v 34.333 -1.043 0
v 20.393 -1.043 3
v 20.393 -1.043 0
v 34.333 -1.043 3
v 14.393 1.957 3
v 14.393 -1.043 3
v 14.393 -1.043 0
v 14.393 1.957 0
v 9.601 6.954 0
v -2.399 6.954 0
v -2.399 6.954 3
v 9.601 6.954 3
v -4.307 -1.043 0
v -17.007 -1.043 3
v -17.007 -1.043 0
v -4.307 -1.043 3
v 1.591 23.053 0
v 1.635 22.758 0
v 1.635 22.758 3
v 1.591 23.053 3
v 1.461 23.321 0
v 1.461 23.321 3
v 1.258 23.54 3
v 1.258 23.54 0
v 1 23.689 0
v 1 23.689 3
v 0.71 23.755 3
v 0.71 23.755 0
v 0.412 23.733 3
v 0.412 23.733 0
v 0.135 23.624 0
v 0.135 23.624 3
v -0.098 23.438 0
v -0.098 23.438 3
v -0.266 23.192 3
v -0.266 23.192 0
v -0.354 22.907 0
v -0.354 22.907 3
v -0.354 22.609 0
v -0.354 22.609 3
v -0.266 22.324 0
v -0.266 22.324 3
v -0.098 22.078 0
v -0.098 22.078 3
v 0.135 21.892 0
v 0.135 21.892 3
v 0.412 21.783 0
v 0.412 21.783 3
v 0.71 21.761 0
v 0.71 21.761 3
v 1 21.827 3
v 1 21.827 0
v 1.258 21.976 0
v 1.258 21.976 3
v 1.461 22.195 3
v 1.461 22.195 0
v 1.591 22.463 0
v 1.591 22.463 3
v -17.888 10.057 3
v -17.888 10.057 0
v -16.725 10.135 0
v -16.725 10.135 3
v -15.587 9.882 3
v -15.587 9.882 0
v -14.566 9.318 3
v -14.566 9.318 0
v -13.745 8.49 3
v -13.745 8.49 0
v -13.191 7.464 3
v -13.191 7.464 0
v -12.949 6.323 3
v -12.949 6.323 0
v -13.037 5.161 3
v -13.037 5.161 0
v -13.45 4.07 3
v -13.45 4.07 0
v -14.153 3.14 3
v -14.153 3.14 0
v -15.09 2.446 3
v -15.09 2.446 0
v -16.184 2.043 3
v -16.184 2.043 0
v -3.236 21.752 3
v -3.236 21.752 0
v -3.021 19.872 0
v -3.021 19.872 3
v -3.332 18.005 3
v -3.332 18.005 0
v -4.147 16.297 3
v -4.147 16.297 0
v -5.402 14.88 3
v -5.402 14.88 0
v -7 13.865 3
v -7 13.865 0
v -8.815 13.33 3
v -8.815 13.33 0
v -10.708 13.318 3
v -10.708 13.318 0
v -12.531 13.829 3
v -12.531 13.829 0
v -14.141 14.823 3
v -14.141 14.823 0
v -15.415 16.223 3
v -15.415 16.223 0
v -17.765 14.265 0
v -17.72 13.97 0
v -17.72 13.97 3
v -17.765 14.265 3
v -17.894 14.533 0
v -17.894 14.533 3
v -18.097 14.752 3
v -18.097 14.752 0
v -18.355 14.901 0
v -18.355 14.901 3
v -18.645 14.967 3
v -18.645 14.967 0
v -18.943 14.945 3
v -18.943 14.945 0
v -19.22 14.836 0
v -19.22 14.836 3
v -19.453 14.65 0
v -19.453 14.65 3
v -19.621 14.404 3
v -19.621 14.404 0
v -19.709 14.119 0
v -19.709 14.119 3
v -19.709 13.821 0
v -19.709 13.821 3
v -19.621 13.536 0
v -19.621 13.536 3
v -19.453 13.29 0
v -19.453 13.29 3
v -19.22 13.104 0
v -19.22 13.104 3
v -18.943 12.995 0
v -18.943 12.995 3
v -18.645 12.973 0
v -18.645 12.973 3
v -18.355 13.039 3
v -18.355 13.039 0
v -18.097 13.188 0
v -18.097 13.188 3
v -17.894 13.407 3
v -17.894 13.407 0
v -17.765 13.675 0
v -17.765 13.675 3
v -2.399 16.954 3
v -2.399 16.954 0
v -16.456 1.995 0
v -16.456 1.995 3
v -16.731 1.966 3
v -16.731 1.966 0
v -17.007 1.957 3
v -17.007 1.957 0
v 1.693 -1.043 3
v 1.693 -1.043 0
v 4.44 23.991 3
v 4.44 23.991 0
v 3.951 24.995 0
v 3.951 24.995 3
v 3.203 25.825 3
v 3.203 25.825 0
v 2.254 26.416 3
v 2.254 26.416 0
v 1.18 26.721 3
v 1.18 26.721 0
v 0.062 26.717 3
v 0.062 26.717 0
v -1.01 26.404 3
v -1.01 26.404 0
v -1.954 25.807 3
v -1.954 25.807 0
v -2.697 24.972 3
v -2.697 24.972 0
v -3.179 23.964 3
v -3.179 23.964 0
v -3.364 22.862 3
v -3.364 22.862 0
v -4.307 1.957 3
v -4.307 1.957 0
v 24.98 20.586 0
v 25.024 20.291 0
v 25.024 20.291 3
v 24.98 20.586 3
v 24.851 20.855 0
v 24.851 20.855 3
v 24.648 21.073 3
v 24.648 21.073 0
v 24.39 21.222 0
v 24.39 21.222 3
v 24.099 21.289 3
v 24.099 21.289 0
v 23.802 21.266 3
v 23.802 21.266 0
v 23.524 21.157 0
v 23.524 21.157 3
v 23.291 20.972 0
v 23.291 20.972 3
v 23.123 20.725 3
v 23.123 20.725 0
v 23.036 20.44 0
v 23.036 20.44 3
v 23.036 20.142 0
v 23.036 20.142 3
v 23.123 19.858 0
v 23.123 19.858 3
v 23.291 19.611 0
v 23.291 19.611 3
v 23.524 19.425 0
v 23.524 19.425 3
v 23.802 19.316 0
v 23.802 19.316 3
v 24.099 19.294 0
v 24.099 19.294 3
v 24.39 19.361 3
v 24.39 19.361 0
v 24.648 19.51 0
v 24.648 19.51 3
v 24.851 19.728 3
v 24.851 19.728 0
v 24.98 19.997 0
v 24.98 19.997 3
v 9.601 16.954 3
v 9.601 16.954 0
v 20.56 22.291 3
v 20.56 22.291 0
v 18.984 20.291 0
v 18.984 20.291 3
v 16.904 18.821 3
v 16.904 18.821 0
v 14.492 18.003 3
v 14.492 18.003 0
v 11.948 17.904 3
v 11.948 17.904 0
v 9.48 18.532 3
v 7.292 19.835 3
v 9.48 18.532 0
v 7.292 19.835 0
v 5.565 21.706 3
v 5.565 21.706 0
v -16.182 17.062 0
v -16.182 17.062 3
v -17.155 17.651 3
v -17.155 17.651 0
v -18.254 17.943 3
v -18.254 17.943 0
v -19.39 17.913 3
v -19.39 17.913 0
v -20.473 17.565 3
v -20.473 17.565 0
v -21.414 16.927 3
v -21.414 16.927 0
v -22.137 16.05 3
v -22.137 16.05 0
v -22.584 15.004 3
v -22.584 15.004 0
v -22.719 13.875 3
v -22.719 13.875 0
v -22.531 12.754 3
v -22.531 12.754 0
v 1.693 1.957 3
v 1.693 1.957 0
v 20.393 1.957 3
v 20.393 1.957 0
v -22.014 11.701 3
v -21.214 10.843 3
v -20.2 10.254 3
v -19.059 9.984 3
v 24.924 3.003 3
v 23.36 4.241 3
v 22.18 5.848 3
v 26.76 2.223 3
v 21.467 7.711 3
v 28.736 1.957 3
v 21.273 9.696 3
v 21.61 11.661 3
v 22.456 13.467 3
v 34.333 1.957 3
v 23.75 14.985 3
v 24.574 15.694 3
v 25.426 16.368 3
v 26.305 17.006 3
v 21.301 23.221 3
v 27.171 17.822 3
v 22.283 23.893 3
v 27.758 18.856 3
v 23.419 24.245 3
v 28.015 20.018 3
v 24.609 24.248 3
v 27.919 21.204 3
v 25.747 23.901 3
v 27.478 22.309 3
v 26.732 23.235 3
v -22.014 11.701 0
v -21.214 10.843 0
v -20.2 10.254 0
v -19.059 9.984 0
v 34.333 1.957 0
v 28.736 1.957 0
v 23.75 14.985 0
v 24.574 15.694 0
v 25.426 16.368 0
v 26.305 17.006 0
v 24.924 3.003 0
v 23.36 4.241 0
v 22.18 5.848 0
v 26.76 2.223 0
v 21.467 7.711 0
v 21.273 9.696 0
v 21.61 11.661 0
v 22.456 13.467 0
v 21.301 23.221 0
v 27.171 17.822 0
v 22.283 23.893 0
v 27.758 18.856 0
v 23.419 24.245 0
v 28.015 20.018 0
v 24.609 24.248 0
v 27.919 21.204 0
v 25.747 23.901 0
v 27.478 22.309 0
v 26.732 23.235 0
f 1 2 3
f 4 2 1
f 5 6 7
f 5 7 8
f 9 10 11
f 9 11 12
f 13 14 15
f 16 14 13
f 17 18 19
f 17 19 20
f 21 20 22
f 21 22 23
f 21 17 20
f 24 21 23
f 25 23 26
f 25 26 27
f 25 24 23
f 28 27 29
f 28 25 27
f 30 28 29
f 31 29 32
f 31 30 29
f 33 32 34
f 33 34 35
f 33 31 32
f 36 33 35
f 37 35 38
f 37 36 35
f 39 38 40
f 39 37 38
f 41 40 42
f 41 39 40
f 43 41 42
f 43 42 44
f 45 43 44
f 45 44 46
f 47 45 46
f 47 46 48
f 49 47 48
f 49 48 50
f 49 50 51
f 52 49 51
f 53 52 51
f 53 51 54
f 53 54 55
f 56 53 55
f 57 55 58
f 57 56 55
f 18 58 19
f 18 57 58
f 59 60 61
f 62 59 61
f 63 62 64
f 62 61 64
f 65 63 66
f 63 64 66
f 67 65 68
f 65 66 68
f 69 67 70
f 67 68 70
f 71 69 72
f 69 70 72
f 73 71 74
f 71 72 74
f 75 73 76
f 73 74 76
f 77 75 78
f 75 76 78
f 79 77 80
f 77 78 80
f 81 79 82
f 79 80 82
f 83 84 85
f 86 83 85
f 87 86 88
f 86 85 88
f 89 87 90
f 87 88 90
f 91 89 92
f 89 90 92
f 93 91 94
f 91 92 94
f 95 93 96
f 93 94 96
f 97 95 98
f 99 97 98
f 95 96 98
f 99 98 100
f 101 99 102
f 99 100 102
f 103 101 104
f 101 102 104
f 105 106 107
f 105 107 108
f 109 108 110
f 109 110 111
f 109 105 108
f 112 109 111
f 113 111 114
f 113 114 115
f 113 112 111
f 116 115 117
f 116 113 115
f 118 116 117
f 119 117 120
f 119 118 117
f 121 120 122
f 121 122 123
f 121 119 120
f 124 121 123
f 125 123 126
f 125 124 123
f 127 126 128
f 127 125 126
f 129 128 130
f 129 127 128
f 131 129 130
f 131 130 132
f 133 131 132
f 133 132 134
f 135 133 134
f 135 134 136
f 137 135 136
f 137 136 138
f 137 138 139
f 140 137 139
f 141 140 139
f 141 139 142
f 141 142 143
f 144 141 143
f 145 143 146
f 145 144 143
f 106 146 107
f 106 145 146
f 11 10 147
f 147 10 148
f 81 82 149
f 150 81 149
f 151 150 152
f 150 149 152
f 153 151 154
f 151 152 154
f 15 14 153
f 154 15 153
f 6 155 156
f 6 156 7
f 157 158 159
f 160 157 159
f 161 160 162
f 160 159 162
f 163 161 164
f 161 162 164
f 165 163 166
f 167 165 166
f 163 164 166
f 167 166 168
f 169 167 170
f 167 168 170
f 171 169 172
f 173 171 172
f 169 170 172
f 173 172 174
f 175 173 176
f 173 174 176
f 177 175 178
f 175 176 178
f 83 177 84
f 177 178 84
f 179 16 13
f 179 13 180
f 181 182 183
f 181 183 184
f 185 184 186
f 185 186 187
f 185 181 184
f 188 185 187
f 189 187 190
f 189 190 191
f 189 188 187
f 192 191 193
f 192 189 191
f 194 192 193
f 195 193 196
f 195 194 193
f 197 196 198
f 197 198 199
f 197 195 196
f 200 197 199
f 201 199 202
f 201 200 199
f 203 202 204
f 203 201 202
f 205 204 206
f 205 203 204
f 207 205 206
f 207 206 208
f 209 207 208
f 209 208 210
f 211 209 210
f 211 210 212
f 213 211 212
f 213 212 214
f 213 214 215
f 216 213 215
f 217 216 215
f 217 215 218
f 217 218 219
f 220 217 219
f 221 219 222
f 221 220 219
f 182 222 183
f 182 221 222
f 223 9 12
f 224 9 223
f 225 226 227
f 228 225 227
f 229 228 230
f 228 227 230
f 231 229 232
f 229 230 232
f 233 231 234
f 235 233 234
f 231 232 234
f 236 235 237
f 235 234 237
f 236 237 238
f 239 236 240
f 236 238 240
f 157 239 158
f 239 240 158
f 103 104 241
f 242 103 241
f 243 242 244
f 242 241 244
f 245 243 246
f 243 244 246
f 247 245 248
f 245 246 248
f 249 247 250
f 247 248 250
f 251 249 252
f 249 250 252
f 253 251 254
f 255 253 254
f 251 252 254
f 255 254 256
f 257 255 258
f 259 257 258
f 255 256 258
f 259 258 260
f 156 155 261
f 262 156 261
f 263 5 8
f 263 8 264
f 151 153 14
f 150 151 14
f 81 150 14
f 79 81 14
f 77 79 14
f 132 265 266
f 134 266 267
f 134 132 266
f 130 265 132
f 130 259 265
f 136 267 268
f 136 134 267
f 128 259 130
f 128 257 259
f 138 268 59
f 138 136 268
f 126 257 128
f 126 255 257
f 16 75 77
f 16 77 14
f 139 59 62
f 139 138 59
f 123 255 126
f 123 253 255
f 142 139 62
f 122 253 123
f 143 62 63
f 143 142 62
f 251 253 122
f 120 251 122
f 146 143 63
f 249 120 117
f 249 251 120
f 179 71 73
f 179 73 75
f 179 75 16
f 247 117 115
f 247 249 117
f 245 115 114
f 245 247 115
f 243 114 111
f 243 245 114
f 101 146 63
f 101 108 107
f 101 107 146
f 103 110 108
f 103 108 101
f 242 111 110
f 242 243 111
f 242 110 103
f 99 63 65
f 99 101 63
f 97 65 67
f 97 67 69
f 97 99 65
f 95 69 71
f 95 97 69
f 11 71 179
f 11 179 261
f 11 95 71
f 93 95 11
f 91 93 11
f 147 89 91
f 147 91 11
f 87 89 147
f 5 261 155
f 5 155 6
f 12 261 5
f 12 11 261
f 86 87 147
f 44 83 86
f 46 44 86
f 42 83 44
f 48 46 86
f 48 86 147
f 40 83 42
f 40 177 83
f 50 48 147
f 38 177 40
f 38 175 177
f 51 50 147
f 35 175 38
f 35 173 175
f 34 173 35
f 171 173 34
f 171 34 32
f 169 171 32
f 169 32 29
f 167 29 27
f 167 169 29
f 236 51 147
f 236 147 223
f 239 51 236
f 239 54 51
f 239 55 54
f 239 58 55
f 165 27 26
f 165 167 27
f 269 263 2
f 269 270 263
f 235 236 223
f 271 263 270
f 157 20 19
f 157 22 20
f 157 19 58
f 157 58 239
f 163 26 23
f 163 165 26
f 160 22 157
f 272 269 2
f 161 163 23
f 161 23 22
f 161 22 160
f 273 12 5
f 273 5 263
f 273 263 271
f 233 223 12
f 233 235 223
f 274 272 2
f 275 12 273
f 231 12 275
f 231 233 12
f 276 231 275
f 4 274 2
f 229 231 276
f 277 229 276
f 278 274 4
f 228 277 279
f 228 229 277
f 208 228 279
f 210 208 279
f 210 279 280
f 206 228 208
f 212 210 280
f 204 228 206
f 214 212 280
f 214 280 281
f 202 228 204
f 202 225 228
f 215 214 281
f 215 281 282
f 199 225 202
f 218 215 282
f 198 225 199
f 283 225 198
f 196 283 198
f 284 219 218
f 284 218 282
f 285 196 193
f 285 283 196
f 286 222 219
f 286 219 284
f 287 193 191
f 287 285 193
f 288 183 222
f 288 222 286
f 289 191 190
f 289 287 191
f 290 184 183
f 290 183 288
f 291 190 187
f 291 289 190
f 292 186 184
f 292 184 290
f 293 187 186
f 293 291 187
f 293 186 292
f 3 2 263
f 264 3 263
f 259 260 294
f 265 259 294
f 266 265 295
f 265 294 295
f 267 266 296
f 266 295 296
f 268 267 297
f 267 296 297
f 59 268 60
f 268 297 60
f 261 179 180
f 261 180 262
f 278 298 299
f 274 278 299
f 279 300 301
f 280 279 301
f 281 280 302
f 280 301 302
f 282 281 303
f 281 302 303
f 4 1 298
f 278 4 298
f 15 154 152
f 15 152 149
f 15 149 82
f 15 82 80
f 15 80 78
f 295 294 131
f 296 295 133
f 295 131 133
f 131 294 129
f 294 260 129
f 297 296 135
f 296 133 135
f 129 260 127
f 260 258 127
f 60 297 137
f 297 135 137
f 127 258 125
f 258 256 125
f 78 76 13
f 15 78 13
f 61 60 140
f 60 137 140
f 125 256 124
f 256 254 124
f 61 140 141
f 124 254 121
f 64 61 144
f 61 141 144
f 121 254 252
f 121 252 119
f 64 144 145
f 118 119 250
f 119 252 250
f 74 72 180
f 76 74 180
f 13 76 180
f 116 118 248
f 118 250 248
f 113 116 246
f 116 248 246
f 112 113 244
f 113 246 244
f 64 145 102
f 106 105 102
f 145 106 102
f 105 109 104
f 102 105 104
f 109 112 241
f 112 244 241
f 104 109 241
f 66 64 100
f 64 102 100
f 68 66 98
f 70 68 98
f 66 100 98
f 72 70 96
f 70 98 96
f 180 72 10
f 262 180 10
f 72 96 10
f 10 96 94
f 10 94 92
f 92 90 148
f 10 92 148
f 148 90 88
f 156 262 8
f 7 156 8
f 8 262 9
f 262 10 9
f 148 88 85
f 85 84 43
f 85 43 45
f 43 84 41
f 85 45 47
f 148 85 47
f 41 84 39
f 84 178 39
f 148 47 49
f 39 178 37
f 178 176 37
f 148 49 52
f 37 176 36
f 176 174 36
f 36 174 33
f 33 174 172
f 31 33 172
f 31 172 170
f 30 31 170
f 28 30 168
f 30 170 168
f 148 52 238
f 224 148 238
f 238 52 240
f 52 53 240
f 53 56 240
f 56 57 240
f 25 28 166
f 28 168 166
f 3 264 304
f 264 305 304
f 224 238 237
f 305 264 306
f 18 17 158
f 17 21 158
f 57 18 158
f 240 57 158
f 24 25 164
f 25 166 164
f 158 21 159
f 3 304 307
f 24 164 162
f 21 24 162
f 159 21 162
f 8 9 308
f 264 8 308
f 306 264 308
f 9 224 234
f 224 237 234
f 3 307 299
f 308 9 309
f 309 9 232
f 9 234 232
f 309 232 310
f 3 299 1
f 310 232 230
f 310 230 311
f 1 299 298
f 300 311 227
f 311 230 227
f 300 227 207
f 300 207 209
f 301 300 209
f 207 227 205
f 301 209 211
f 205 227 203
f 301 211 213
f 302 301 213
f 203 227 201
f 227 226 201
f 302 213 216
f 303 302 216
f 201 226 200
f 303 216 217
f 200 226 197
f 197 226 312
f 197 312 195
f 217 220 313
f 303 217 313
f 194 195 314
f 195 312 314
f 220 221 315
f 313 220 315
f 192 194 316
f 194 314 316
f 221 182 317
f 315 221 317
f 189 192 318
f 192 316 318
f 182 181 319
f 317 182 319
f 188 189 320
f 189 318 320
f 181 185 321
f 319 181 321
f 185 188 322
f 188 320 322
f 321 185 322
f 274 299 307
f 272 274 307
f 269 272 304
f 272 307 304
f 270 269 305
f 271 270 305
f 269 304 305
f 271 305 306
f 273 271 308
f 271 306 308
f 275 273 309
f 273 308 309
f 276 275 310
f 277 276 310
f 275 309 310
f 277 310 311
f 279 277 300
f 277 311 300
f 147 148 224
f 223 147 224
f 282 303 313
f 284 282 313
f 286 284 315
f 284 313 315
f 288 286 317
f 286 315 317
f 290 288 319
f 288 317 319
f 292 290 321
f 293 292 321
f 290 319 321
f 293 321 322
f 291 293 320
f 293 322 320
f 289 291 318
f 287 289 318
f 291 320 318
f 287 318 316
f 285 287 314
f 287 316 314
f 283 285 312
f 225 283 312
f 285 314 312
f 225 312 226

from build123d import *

# Parameters (mm, degrees)
SKETCH_2_R          = 1
SKETCH_2_W          = 12
SKETCH_2_H          = 10
EXTRUDE_1_DEPTH     = 3
SKETCH_3_W          = 67.5
SKETCH_3_H          = 19.05
CUT_EXTRUDE_1_DEPTH = 3
SKETCH_4_W          = 6
SKETCH_4_H          = 3
CUT_EXTRUDE_2_DEPTH = 3
CUT_EXTRUDE_START   = -3
CUT_EXTRUDE_3_DEPTH = 3


with BuildPart() as part:
    # 스케치2 → 보스-돌출1 (new body)
    with BuildSketch(Plane.XY):
        with BuildLine():
            Line((-25.485574715, -6.758293196), (31.501216284, -6.758293196))
            ThreePointArc((31.501216284, -6.758293196), (38.452055955, -4.004295945), (41.630451907, 2.763013133))
            ThreePointArc((41.630451907, 2.763013133), (34.930270172, 4.650120348), (27.980151111, 4.263527588))
            ThreePointArc((27.980151111, 4.263527588), (30.476148958, 15.174416231), (26.885608279, 25.775619647))
            ThreePointArc((26.885608279, 25.775619647), (19.196067088, 24.921345998), (12.532472084, 20.9900194))
            ThreePointArc((12.532472084, 20.9900194), (7.013386949, 25.131320034), (0.635, 27.763211294))
            ThreePointArc((0.635, 27.763211294), (-5.803216647, 23.07550321), (-10.623464465, 16.735909244))
            ThreePointArc((-10.623464465, 16.735909244), (-16.694266299, 18.270908366), (-22.954465563, 18.415))
            ThreePointArc((-22.954465563, 18.415), (-24.716513625, 12.803357438), (-25.333146618, 6.95398915))
            ThreePointArc((-25.333146618, 6.95398915), (-32.051736926, 6.951939733), (-37.86649166, 3.586217327))
            ThreePointArc((-37.86649166, 3.586217327), (-33.552420479, -3.831808304), (-25.485574715, -6.758293196))
        make_face()
        with Locations((-18.720080529, 13.97)):
            Circle(SKETCH_2_R, mode=Mode.SUBTRACT)
        with Locations((0.635, 22.758099244)):
            Circle(SKETCH_2_R, mode=Mode.SUBTRACT)
        with Locations((24.024354369, 20.291387406)):
            Circle(SKETCH_2_R, mode=Mode.SUBTRACT)
        with Locations((3.600778132, 11.95398915)):
            Rectangle(SKETCH_2_W, SKETCH_2_H, mode=Mode.SUBTRACT)
    extrude(amount=EXTRUDE_1_DEPTH)

    # 스케치3 → 컷-돌출1 (cut)
    with BuildSketch(Plane.XY.offset(3)):
        with Locations((0.583193505, -10.568293196)):
            Rectangle(SKETCH_3_W, SKETCH_3_H)
    extrude(amount=-CUT_EXTRUDE_1_DEPTH, mode=Mode.SUBTRACT)

    # 스케치4 → 컷-돌출2 (cut)
    with BuildSketch(Plane.XY.offset(3)):
        with Locations((-20.006806495, 0.456706804)):
            Rectangle(SKETCH_4_W, SKETCH_4_H)
        with Locations((17.393193505, 0.456706804)):
            Rectangle(SKETCH_4_W, SKETCH_4_H)
        with Locations((-1.306806495, 0.456706804)):
            Rectangle(SKETCH_4_W, SKETCH_4_H)
    extrude(amount=-CUT_EXTRUDE_2_DEPTH, mode=Mode.SUBTRACT)

    # 스케치6 → 컷-돌출3 (cut)
    with BuildSketch(Plane.XY.offset(3).offset(CUT_EXTRUDE_START)):
        with BuildLine():
            Line((-17.006806495, 1.956706804), (-23.006806495, 1.956706804))
            Line((-23.006806495, 1.956706804), (-23.006806495, -1.043293196))
            Line((-23.006806495, -1.043293196), (-33.166806495, -1.043293196))
            Line((-33.166806495, -1.043293196), (-33.166806495, -4.141334476))
            ThreePointArc((-33.166806495, -4.141334476), (-36.235049915, -0.71447027), (-37.86649166, 3.586217327))
            ThreePointArc((-37.86649166, 3.586217327), (-32.051736926, 6.951939733), (-25.333146618, 6.95398915))
            ThreePointArc((-25.333146618, 6.95398915), (-24.716513625, 12.803357438), (-22.954465563, 18.415))
            ThreePointArc((-22.954465563, 18.415), (-16.694266299, 18.270908366), (-10.623464465, 16.735909244))
            ThreePointArc((-10.623464465, 16.735909244), (-5.803216647, 23.07550321), (0.635, 27.763211294))
            ThreePointArc((0.635, 27.763211294), (7.013386949, 25.131320034), (12.532472084, 20.9900194))
            ThreePointArc((12.532472084, 20.9900194), (19.196067088, 24.921345998), (26.885608279, 25.775619647))
            ThreePointArc((26.885608279, 25.775619647), (30.476148958, 15.174416231), (27.980151111, 4.263527588))
            ThreePointArc((27.980151111, 4.263527588), (34.930270172, 4.650120348), (41.630451907, 2.763013133))
            ThreePointArc((41.630451907, 2.763013133), (39.424820657, -2.950900295), (34.333193505, -6.355154812))
            Line((34.333193505, -6.355154812), (34.333193505, -1.043293196))
            Line((34.333193505, -1.043293196), (34.333193505, 1.956706804))
            Line((34.333193505, 1.956706804), (28.736134873, 1.956706804))
            ThreePointArc((28.736134873, 1.956706804), (21.761064735, 6.755645136), (23.749798637, 14.985247192))
            ThreePointArc((23.749798637, 14.985247192), (24.996231791, 16.035094284), (26.305425054, 17.005551662))
            ThreePointArc((26.305425054, 17.005551662), (26.732453483, 23.235228296), (20.559975673, 22.290907411))
            ThreePointArc((20.559975673, 22.290907411), (11.947819263, 17.903967637), (4.440273192, 23.99093984))
            ThreePointArc((4.440273192, 23.99093984), (-0.484844776, 26.598144514), (-3.236462793, 21.752228554))
            ThreePointArc((-3.236462793, 21.752228554), (-6.999770707, 13.865014257), (-15.414747401, 16.222725663))
            ThreePointArc((-15.414747401, 16.222725663), (-20.472957028, 17.565472706), (-22.530630542, 12.753567266))
            ThreePointArc((-22.530630542, 12.753567266), (-20.728909441, 10.511010783), (-17.88821468, 10.057456172))
            ThreePointArc((-17.88821468, 10.057456172), (-13.029100566, 6.902297391), (-16.184259346, 2.043183277))
            ThreePointArc((-16.184259346, 2.043183277), (-16.593266293, 1.978385333), (-17.006806495, 1.956706804))
        make_face()
    extrude(amount=CUT_EXTRUDE_3_DEPTH, mode=Mode.SUBTRACT)


solid = part.part
